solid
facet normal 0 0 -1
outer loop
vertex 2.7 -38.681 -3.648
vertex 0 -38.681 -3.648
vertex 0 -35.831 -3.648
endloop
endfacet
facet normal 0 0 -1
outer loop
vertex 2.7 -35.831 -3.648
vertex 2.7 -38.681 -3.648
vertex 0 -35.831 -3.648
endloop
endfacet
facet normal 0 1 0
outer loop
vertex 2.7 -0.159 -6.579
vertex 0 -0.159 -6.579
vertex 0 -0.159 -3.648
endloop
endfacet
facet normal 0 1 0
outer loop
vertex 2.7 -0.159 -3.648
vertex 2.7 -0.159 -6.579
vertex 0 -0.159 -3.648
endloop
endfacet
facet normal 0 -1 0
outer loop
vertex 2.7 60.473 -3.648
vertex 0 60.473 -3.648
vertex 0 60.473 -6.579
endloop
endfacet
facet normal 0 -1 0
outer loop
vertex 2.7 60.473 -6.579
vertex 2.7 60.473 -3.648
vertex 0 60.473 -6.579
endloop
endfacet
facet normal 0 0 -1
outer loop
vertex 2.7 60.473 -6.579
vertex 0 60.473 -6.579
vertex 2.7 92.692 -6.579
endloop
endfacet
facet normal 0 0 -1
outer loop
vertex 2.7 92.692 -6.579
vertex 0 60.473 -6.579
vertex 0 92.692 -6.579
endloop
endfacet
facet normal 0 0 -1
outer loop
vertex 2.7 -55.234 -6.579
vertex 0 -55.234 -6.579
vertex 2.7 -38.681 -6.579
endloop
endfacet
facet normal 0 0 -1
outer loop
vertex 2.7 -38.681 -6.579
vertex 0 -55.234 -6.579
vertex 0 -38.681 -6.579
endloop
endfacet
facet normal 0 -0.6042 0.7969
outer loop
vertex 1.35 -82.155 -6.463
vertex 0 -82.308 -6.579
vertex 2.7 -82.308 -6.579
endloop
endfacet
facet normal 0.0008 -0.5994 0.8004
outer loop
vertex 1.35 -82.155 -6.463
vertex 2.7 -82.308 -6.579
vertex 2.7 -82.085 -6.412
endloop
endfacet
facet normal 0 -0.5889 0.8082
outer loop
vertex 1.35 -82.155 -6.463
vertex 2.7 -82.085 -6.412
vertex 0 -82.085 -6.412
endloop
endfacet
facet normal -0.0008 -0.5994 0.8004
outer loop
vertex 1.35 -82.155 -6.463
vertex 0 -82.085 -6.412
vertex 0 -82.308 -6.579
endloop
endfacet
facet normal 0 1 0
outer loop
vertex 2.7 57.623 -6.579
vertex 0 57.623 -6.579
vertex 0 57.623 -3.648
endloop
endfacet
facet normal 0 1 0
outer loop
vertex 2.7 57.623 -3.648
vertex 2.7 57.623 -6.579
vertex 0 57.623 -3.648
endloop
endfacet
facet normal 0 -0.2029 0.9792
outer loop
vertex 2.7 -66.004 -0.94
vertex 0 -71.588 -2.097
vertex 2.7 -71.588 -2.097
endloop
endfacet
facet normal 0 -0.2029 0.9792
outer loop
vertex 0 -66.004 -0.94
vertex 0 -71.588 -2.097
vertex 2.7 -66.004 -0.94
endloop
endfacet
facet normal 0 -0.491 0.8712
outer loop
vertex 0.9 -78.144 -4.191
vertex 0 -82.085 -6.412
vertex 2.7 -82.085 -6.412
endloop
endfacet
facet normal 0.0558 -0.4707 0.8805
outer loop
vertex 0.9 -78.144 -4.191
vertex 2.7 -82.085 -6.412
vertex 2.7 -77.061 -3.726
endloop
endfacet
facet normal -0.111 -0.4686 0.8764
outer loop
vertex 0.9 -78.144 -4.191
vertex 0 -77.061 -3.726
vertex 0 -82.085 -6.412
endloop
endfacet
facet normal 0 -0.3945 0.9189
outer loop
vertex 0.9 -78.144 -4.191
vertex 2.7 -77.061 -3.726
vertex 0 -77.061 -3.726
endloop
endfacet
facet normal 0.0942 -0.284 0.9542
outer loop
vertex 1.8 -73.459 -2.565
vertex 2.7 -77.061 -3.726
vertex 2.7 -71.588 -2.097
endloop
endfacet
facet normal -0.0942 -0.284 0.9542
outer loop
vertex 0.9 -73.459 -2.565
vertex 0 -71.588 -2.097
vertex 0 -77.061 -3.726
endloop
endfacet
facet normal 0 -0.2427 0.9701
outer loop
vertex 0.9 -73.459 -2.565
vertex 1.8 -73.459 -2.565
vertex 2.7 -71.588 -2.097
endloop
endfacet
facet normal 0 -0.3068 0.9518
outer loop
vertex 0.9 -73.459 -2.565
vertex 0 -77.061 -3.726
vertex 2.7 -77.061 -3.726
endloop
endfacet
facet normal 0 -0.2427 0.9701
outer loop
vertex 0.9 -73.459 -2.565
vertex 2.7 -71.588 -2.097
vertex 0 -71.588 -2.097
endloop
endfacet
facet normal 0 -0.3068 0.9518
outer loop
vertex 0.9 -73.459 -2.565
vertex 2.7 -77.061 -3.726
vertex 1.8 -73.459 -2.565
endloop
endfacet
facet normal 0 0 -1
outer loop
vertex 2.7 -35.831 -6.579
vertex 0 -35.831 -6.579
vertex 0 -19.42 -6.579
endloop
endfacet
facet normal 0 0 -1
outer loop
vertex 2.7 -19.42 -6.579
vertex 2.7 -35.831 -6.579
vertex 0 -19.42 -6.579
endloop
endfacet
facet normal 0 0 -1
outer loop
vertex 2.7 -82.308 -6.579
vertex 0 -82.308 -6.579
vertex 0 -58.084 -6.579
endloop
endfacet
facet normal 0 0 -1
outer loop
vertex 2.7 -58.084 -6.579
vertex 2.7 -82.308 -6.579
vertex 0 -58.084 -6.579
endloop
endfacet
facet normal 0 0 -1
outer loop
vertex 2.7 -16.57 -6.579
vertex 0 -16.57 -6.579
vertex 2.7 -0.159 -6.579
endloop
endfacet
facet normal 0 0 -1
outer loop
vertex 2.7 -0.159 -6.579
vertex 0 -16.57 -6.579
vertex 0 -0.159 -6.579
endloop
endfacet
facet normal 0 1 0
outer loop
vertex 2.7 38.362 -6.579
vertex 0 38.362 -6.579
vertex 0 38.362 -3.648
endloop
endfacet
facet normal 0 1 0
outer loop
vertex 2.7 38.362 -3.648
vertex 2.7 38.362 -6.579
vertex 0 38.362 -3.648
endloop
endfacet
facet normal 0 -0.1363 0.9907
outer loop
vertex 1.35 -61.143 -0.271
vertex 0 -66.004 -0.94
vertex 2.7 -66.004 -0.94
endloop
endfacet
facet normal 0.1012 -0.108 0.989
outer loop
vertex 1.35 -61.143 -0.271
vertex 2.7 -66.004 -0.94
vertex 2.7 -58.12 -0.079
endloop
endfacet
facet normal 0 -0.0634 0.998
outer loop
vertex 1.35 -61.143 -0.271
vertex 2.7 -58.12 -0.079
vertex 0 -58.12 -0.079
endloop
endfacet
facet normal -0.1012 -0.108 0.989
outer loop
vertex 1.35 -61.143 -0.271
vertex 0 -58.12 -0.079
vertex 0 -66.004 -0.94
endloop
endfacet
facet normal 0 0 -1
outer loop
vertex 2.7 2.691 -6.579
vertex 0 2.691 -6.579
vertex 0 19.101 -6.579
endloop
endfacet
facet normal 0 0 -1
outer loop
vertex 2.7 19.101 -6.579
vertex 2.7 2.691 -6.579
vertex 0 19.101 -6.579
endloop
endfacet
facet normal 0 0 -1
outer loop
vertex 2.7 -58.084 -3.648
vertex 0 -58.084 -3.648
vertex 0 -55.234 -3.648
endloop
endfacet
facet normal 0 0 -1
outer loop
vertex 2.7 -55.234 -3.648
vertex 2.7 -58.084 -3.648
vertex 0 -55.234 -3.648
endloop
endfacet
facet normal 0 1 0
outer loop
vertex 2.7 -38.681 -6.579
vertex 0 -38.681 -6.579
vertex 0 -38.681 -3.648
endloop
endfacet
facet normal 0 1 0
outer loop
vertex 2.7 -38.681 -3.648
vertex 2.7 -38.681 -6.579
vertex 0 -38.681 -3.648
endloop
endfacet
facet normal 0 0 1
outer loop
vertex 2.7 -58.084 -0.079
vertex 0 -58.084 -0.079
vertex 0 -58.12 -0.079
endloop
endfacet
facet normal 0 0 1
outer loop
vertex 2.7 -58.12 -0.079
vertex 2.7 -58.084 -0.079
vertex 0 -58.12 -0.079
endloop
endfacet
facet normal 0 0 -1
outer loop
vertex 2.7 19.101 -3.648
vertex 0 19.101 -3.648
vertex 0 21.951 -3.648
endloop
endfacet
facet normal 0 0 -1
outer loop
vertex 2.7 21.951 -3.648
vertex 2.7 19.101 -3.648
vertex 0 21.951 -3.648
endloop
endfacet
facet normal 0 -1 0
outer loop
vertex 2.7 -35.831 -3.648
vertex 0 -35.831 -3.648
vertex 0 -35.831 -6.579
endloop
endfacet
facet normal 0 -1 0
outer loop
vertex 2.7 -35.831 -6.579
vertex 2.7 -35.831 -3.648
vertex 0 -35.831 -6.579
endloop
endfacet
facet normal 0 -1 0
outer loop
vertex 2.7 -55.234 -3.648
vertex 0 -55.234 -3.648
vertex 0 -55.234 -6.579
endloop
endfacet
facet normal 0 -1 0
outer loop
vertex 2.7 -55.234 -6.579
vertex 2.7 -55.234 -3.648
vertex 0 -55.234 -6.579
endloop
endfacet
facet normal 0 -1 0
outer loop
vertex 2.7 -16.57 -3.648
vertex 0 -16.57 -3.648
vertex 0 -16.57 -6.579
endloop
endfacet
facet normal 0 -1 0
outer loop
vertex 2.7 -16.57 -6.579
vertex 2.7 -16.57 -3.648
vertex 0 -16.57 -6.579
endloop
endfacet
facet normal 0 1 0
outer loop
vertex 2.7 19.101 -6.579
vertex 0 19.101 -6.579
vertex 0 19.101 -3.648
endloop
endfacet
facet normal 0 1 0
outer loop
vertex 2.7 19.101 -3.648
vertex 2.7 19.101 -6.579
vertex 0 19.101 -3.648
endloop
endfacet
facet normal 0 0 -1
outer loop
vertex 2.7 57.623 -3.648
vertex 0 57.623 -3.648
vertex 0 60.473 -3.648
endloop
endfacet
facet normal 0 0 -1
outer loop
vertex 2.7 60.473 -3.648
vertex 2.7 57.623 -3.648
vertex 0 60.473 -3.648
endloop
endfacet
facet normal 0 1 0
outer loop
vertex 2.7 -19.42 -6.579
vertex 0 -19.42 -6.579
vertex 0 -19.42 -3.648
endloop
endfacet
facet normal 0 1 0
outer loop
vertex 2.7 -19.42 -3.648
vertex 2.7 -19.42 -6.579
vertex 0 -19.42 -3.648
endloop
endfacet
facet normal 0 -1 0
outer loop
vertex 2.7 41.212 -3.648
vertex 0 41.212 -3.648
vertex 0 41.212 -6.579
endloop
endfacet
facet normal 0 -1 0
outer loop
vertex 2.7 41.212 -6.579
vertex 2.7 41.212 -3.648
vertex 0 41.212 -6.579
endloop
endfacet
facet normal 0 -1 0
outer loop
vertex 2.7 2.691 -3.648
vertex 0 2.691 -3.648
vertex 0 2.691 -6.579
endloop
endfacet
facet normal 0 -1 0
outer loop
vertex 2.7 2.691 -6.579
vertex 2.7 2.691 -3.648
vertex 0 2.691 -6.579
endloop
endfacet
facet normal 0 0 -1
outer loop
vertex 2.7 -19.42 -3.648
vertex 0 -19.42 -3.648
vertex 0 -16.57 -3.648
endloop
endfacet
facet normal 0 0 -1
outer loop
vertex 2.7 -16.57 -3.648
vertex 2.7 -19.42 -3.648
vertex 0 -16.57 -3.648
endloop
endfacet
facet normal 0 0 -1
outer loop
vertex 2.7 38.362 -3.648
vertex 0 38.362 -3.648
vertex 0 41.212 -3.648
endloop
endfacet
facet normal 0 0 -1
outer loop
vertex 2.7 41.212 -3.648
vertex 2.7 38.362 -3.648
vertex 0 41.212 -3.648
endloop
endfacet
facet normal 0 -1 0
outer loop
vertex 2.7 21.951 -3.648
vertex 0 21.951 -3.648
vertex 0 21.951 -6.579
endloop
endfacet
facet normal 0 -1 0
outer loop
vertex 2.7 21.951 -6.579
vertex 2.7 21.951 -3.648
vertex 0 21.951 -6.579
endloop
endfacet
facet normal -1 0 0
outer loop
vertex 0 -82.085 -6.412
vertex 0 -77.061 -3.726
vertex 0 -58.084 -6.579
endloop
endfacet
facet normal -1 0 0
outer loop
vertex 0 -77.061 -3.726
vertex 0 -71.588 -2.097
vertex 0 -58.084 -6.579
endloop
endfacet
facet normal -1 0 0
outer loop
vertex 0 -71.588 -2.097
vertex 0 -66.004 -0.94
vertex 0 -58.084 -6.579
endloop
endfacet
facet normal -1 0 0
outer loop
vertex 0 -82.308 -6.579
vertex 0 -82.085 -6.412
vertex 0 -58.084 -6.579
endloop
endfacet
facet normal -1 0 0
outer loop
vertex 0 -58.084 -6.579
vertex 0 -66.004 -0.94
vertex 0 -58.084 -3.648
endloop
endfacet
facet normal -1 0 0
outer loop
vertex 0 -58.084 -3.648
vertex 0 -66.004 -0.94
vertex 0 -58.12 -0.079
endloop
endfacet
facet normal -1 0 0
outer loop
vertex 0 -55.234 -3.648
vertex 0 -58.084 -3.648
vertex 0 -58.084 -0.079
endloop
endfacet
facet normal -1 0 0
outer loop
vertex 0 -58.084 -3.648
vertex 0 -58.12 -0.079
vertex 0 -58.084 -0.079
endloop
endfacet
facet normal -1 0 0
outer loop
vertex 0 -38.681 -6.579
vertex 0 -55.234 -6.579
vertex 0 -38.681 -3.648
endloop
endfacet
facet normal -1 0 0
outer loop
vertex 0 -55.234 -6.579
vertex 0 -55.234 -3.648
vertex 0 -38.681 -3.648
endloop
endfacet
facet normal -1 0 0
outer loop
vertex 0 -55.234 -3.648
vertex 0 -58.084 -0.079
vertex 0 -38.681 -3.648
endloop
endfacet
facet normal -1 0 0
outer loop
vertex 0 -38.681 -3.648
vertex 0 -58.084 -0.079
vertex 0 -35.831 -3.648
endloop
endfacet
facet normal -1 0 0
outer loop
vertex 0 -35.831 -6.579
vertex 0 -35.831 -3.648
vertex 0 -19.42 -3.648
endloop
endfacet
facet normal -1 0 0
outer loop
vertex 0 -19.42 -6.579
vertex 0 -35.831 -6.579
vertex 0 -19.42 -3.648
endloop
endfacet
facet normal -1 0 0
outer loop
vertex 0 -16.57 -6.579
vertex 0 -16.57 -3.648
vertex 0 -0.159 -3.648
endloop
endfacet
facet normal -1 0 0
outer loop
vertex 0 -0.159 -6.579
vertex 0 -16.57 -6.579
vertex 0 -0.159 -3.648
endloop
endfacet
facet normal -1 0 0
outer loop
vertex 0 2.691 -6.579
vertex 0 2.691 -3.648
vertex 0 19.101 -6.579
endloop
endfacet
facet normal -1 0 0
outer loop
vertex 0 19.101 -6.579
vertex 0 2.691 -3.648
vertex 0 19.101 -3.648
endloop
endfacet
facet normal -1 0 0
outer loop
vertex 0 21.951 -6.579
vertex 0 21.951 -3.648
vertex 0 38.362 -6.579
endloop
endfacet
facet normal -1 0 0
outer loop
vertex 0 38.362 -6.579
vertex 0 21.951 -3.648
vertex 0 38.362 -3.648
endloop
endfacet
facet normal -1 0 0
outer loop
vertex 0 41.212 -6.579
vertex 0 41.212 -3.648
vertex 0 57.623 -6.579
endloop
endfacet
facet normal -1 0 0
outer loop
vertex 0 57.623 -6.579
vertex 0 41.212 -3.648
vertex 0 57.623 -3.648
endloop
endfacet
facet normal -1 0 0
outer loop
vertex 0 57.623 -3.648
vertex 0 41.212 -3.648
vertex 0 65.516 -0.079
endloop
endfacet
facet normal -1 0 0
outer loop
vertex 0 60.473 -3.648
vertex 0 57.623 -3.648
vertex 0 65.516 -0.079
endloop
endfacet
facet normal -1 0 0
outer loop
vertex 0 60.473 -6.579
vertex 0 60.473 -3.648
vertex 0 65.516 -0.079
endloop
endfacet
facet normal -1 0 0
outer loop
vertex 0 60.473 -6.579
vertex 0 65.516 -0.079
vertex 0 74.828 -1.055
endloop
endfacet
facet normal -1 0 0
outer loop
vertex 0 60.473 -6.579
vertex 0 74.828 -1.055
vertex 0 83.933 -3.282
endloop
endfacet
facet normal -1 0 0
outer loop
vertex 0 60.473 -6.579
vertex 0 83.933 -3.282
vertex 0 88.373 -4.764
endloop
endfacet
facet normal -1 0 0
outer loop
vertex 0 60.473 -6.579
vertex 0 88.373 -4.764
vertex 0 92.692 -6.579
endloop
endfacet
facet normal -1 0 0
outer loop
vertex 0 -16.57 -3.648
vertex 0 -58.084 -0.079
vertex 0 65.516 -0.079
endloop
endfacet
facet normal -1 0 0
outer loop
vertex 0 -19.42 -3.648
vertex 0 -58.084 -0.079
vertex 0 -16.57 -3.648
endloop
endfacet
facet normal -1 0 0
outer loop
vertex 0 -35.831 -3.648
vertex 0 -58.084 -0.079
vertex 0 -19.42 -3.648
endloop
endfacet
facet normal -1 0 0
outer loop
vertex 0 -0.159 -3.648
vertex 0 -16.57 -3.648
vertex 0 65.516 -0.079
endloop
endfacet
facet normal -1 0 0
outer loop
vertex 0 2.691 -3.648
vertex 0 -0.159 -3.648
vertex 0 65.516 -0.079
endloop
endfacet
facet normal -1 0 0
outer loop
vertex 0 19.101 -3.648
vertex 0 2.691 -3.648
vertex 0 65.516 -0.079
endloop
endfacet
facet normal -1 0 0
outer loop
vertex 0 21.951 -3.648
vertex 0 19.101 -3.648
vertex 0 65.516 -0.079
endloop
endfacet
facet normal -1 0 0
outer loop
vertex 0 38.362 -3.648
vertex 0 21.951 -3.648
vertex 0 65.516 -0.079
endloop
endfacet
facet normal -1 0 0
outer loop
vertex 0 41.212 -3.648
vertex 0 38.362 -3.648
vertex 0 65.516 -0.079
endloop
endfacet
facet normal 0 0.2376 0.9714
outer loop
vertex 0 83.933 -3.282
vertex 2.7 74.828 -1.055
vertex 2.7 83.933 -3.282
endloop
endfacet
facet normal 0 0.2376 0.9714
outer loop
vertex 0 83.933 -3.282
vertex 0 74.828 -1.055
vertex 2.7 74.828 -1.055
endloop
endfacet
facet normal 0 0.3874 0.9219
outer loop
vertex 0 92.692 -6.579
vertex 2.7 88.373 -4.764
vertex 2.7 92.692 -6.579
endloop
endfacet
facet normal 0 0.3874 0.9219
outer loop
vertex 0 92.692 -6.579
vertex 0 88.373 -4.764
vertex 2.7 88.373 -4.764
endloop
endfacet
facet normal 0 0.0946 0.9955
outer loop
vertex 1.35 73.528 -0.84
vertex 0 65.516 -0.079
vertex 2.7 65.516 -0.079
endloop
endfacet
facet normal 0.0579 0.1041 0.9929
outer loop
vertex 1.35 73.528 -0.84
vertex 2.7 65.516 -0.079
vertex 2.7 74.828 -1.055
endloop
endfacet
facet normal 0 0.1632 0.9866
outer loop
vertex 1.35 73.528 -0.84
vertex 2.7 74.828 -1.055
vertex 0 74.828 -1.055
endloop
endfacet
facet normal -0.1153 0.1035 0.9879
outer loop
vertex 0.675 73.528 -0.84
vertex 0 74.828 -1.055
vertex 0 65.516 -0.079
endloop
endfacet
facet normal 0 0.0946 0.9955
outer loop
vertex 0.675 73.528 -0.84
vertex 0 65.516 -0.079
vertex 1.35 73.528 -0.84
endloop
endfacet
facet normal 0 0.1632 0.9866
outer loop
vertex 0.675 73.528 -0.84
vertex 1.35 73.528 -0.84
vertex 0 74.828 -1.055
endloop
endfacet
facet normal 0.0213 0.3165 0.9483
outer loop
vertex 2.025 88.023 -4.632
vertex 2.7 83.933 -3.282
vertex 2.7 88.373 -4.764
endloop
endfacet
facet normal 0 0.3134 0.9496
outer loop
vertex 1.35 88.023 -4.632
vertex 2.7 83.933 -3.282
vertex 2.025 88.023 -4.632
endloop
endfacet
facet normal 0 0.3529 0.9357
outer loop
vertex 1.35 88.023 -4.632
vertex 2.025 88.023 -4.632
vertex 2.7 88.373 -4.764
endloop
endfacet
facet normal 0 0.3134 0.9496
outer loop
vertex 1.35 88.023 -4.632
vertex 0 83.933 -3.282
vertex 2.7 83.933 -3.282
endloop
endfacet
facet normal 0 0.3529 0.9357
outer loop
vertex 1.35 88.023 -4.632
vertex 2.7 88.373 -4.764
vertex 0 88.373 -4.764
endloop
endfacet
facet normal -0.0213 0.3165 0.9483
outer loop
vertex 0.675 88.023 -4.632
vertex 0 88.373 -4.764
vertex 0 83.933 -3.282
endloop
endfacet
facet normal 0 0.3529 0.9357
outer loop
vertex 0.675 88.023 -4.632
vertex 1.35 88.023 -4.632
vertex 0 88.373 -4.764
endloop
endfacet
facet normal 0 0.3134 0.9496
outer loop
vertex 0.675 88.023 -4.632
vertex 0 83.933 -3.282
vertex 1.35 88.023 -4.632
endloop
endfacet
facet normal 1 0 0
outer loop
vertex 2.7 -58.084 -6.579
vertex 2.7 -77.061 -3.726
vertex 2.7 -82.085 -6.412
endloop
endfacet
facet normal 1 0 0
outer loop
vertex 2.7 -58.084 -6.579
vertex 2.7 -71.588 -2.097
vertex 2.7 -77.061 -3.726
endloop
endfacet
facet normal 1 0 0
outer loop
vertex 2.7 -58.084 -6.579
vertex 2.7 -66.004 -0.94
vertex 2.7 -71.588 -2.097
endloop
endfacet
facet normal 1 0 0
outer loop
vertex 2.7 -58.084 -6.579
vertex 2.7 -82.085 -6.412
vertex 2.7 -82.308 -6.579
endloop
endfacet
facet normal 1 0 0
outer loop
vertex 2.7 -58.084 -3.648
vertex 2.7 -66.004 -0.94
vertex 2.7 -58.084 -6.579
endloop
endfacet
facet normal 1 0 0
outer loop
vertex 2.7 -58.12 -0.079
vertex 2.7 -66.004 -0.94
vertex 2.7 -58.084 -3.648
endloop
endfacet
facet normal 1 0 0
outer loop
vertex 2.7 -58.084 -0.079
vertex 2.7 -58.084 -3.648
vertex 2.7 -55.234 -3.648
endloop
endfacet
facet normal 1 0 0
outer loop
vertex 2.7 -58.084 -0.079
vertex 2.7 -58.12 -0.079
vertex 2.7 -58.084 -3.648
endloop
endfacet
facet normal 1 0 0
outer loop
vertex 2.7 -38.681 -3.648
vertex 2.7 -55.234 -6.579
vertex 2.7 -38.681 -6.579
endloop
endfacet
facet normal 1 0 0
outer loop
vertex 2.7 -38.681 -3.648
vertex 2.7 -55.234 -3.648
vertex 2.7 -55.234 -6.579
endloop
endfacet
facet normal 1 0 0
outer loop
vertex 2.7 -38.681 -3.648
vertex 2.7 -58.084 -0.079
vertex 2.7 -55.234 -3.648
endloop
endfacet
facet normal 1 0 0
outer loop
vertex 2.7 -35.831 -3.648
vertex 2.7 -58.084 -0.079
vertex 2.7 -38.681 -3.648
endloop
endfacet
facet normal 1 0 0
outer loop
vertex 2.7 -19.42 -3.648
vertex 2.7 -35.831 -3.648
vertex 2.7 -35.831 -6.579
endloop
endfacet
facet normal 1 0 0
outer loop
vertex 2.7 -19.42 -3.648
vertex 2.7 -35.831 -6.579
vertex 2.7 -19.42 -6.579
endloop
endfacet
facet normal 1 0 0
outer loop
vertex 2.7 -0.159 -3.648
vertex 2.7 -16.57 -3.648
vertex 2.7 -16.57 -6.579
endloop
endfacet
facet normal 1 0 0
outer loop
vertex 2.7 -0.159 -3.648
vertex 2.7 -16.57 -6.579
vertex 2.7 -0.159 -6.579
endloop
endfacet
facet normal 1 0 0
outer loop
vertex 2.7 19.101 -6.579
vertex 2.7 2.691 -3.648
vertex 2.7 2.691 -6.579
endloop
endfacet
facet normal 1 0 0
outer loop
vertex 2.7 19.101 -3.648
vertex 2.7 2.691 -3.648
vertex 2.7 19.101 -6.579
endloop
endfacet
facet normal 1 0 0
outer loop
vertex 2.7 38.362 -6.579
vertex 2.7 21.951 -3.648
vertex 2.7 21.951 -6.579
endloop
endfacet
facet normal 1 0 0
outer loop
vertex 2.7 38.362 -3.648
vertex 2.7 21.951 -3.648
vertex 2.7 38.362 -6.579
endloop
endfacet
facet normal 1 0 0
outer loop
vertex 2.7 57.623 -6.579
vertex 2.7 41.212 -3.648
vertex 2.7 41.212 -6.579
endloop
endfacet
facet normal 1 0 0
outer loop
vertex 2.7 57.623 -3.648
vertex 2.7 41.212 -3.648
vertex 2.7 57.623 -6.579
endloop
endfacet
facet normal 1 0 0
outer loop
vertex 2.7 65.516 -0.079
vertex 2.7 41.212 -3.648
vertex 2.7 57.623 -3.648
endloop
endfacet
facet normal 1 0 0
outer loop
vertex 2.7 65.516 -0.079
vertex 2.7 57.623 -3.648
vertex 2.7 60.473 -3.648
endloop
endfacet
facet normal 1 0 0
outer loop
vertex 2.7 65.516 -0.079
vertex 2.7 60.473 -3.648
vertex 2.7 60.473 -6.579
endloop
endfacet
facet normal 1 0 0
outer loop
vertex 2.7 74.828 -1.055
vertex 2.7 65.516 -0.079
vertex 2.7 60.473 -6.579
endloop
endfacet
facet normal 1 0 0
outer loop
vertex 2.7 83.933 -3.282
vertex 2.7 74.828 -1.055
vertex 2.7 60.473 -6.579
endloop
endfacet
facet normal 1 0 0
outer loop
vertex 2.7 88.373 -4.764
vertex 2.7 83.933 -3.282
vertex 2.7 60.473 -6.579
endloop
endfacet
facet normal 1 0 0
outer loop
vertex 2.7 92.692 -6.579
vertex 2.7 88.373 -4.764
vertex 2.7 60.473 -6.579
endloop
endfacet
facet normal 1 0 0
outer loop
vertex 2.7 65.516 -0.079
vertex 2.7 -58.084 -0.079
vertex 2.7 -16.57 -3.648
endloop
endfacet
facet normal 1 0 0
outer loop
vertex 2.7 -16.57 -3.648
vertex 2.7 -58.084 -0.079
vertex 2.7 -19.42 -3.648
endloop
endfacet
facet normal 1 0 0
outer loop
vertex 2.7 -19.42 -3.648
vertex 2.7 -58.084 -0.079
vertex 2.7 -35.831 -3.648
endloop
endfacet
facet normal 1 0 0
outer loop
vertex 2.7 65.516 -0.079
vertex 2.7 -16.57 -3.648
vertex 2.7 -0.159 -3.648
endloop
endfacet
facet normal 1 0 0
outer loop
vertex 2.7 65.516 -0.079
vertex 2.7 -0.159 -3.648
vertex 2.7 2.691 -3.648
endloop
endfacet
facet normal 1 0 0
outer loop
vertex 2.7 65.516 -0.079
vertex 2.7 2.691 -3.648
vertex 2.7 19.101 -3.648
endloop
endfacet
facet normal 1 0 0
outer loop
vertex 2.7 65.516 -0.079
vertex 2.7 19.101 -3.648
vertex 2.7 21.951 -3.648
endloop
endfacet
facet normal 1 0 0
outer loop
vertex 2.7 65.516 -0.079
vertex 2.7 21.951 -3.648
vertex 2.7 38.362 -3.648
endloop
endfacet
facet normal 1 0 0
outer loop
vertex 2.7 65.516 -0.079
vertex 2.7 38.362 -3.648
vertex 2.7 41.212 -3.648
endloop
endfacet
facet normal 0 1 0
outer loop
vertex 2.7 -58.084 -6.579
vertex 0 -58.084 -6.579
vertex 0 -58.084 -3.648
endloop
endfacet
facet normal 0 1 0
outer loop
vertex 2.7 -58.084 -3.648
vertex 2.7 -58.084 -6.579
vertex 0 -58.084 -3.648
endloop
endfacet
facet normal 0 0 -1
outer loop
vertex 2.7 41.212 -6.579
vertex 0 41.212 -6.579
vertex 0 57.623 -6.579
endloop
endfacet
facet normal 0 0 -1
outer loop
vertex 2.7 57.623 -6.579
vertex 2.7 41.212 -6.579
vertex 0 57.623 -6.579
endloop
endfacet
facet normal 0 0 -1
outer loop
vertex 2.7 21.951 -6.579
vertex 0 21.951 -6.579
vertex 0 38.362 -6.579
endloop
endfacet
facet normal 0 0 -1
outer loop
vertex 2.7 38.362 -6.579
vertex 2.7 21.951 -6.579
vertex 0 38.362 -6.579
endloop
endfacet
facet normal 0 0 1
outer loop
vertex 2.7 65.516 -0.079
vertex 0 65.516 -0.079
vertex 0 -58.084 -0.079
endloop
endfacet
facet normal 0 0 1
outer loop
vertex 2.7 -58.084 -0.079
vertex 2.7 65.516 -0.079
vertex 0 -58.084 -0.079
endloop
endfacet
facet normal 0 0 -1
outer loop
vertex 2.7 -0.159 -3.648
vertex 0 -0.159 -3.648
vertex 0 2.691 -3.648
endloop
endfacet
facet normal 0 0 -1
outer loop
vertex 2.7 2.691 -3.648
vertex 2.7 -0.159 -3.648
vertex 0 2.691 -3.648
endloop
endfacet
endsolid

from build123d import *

# Parameters (mm, degrees)
SALIENTE_EXTRUIR1_DEPTH = 2.7


with BuildPart() as part:
    # Croquis1 → Saliente-Extruir1 (new body)
    with BuildSketch(Plane.YZ):
        with BuildLine():
            Line((-55.234115884, -6.578730109), (-38.680874308, -6.578730181))
            Line((-38.680874308, -6.578730181), (-38.680874295, -3.648339402))
            Line((-38.680874295, -3.648339402), (-35.830874295, -3.648339414))
            Line((-35.830874295, -3.648339414), (-35.830874308, -6.578730194))
            Line((-35.830874308, -6.578730194), (-19.420064078, -6.578730266))
            Line((-19.420064078, -6.578730266), (-19.420064066, -3.648339486))
            Line((-19.420064066, -3.648339486), (-16.570064066, -3.648339498))
            Line((-16.570064066, -3.648339498), (-16.570064078, -6.578730278))
            Line((-16.570064078, -6.578730278), (-0.159253849, -6.57873035))
            Line((-0.159253849, -6.57873035), (-0.159253836, -3.64833957))
            Line((-0.159253836, -3.64833957), (2.690746164, -3.648339583))
            Line((2.690746164, -3.648339583), (2.690746151, -6.578730362))
            Line((2.690746151, -6.578730362), (19.101467122, -6.578730434))
            Line((19.101467122, -6.578730434), (19.101467135, -3.648339654))
            Line((19.101467135, -3.648339654), (21.951467135, -3.648339667))
            Line((21.951467135, -3.648339667), (21.951467122, -6.578730446))
            Line((21.951467122, -6.578730446), (38.36236661, -6.578730518))
            Line((38.36236661, -6.578730518), (38.362366623, -3.648339738))
            Line((38.362366623, -3.648339738), (41.212366623, -3.648339751))
            Line((41.212366623, -3.648339751), (41.21236661, -6.57873053))
            Line((41.21236661, -6.57873053), (57.62317684, -6.578730602))
            Line((57.62317684, -6.578730602), (57.623176853, -3.648339823))
            Line((57.623176853, -3.648339823), (60.473176853, -3.648339835))
            Line((60.473176853, -3.648339835), (60.47317684, -6.579394365))
            Line((60.47317684, -6.579394365), (92.691783737, -6.579394365))
            add(Edge.make_bspline(
                [(65.515708358, -0.078730637), (68.197256802, -0.258981281), (73.772414922, -0.633736737), (81.258018047, -2.465410904), (87.672687502, -4.376295676), (91.146213496, -5.900976656), (92.691783737, -6.579394365)],
                knots=[0, 0, 0, 0, 0.286390458, 0.595428587, 0.819983056, 1, 1, 1, 1], degree=3))
            Line((65.515708358, -0.078730637), (-58.084017099, -0.078730097))
            Line((-58.084017099, -0.078730097), (-58.120461042, -0.078730097))
            add(Edge.make_bspline(
                [(-66.004307996, -0.939930258), (-64.387448411, -0.680254728), (-61.772849484, -0.260337396), (-59.129262369, -0.128890612), (-58.120461042, -0.078730097)],
                knots=[0, 0, 0, 0, 0.61839679, 1, 1, 1, 1], degree=3))
            add(Edge.make_bspline(
                [(-82.084508668, -6.41226612), (-80.796356469, -5.618417967), (-78.096313761, -3.954465587), (-72.617339557, -2.219536347), (-68.499900924, -1.422817975), (-66.004307996, -0.939930258)],
                knots=[0, 0, 0, 0, 0.26437177, 0.554138766, 1, 1, 1, 1], degree=3))
            add(Edge.make_bspline(
                [(-82.308216262, -6.578730097), (-82.257659483, -6.539388838), (-82.184342615, -6.482244345), (-82.108242057, -6.428888889), (-82.084508668, -6.41226612)],
                knots=[0, 0, 0, 0, 0.688452323, 1, 1, 1, 1], degree=3))
            Line((-82.308216262, -6.578730097), (-58.084115884, -6.578730097))
            Line((-58.084115884, -6.578730097), (-58.084115884, -3.648339317))
            Line((-58.084115884, -3.648339317), (-55.234115884, -3.648339317))
            Line((-55.234115884, -3.648339317), (-55.234115884, -6.578730109))
        make_face()
    extrude(amount=SALIENTE_EXTRUIR1_DEPTH)


solid = part.part
